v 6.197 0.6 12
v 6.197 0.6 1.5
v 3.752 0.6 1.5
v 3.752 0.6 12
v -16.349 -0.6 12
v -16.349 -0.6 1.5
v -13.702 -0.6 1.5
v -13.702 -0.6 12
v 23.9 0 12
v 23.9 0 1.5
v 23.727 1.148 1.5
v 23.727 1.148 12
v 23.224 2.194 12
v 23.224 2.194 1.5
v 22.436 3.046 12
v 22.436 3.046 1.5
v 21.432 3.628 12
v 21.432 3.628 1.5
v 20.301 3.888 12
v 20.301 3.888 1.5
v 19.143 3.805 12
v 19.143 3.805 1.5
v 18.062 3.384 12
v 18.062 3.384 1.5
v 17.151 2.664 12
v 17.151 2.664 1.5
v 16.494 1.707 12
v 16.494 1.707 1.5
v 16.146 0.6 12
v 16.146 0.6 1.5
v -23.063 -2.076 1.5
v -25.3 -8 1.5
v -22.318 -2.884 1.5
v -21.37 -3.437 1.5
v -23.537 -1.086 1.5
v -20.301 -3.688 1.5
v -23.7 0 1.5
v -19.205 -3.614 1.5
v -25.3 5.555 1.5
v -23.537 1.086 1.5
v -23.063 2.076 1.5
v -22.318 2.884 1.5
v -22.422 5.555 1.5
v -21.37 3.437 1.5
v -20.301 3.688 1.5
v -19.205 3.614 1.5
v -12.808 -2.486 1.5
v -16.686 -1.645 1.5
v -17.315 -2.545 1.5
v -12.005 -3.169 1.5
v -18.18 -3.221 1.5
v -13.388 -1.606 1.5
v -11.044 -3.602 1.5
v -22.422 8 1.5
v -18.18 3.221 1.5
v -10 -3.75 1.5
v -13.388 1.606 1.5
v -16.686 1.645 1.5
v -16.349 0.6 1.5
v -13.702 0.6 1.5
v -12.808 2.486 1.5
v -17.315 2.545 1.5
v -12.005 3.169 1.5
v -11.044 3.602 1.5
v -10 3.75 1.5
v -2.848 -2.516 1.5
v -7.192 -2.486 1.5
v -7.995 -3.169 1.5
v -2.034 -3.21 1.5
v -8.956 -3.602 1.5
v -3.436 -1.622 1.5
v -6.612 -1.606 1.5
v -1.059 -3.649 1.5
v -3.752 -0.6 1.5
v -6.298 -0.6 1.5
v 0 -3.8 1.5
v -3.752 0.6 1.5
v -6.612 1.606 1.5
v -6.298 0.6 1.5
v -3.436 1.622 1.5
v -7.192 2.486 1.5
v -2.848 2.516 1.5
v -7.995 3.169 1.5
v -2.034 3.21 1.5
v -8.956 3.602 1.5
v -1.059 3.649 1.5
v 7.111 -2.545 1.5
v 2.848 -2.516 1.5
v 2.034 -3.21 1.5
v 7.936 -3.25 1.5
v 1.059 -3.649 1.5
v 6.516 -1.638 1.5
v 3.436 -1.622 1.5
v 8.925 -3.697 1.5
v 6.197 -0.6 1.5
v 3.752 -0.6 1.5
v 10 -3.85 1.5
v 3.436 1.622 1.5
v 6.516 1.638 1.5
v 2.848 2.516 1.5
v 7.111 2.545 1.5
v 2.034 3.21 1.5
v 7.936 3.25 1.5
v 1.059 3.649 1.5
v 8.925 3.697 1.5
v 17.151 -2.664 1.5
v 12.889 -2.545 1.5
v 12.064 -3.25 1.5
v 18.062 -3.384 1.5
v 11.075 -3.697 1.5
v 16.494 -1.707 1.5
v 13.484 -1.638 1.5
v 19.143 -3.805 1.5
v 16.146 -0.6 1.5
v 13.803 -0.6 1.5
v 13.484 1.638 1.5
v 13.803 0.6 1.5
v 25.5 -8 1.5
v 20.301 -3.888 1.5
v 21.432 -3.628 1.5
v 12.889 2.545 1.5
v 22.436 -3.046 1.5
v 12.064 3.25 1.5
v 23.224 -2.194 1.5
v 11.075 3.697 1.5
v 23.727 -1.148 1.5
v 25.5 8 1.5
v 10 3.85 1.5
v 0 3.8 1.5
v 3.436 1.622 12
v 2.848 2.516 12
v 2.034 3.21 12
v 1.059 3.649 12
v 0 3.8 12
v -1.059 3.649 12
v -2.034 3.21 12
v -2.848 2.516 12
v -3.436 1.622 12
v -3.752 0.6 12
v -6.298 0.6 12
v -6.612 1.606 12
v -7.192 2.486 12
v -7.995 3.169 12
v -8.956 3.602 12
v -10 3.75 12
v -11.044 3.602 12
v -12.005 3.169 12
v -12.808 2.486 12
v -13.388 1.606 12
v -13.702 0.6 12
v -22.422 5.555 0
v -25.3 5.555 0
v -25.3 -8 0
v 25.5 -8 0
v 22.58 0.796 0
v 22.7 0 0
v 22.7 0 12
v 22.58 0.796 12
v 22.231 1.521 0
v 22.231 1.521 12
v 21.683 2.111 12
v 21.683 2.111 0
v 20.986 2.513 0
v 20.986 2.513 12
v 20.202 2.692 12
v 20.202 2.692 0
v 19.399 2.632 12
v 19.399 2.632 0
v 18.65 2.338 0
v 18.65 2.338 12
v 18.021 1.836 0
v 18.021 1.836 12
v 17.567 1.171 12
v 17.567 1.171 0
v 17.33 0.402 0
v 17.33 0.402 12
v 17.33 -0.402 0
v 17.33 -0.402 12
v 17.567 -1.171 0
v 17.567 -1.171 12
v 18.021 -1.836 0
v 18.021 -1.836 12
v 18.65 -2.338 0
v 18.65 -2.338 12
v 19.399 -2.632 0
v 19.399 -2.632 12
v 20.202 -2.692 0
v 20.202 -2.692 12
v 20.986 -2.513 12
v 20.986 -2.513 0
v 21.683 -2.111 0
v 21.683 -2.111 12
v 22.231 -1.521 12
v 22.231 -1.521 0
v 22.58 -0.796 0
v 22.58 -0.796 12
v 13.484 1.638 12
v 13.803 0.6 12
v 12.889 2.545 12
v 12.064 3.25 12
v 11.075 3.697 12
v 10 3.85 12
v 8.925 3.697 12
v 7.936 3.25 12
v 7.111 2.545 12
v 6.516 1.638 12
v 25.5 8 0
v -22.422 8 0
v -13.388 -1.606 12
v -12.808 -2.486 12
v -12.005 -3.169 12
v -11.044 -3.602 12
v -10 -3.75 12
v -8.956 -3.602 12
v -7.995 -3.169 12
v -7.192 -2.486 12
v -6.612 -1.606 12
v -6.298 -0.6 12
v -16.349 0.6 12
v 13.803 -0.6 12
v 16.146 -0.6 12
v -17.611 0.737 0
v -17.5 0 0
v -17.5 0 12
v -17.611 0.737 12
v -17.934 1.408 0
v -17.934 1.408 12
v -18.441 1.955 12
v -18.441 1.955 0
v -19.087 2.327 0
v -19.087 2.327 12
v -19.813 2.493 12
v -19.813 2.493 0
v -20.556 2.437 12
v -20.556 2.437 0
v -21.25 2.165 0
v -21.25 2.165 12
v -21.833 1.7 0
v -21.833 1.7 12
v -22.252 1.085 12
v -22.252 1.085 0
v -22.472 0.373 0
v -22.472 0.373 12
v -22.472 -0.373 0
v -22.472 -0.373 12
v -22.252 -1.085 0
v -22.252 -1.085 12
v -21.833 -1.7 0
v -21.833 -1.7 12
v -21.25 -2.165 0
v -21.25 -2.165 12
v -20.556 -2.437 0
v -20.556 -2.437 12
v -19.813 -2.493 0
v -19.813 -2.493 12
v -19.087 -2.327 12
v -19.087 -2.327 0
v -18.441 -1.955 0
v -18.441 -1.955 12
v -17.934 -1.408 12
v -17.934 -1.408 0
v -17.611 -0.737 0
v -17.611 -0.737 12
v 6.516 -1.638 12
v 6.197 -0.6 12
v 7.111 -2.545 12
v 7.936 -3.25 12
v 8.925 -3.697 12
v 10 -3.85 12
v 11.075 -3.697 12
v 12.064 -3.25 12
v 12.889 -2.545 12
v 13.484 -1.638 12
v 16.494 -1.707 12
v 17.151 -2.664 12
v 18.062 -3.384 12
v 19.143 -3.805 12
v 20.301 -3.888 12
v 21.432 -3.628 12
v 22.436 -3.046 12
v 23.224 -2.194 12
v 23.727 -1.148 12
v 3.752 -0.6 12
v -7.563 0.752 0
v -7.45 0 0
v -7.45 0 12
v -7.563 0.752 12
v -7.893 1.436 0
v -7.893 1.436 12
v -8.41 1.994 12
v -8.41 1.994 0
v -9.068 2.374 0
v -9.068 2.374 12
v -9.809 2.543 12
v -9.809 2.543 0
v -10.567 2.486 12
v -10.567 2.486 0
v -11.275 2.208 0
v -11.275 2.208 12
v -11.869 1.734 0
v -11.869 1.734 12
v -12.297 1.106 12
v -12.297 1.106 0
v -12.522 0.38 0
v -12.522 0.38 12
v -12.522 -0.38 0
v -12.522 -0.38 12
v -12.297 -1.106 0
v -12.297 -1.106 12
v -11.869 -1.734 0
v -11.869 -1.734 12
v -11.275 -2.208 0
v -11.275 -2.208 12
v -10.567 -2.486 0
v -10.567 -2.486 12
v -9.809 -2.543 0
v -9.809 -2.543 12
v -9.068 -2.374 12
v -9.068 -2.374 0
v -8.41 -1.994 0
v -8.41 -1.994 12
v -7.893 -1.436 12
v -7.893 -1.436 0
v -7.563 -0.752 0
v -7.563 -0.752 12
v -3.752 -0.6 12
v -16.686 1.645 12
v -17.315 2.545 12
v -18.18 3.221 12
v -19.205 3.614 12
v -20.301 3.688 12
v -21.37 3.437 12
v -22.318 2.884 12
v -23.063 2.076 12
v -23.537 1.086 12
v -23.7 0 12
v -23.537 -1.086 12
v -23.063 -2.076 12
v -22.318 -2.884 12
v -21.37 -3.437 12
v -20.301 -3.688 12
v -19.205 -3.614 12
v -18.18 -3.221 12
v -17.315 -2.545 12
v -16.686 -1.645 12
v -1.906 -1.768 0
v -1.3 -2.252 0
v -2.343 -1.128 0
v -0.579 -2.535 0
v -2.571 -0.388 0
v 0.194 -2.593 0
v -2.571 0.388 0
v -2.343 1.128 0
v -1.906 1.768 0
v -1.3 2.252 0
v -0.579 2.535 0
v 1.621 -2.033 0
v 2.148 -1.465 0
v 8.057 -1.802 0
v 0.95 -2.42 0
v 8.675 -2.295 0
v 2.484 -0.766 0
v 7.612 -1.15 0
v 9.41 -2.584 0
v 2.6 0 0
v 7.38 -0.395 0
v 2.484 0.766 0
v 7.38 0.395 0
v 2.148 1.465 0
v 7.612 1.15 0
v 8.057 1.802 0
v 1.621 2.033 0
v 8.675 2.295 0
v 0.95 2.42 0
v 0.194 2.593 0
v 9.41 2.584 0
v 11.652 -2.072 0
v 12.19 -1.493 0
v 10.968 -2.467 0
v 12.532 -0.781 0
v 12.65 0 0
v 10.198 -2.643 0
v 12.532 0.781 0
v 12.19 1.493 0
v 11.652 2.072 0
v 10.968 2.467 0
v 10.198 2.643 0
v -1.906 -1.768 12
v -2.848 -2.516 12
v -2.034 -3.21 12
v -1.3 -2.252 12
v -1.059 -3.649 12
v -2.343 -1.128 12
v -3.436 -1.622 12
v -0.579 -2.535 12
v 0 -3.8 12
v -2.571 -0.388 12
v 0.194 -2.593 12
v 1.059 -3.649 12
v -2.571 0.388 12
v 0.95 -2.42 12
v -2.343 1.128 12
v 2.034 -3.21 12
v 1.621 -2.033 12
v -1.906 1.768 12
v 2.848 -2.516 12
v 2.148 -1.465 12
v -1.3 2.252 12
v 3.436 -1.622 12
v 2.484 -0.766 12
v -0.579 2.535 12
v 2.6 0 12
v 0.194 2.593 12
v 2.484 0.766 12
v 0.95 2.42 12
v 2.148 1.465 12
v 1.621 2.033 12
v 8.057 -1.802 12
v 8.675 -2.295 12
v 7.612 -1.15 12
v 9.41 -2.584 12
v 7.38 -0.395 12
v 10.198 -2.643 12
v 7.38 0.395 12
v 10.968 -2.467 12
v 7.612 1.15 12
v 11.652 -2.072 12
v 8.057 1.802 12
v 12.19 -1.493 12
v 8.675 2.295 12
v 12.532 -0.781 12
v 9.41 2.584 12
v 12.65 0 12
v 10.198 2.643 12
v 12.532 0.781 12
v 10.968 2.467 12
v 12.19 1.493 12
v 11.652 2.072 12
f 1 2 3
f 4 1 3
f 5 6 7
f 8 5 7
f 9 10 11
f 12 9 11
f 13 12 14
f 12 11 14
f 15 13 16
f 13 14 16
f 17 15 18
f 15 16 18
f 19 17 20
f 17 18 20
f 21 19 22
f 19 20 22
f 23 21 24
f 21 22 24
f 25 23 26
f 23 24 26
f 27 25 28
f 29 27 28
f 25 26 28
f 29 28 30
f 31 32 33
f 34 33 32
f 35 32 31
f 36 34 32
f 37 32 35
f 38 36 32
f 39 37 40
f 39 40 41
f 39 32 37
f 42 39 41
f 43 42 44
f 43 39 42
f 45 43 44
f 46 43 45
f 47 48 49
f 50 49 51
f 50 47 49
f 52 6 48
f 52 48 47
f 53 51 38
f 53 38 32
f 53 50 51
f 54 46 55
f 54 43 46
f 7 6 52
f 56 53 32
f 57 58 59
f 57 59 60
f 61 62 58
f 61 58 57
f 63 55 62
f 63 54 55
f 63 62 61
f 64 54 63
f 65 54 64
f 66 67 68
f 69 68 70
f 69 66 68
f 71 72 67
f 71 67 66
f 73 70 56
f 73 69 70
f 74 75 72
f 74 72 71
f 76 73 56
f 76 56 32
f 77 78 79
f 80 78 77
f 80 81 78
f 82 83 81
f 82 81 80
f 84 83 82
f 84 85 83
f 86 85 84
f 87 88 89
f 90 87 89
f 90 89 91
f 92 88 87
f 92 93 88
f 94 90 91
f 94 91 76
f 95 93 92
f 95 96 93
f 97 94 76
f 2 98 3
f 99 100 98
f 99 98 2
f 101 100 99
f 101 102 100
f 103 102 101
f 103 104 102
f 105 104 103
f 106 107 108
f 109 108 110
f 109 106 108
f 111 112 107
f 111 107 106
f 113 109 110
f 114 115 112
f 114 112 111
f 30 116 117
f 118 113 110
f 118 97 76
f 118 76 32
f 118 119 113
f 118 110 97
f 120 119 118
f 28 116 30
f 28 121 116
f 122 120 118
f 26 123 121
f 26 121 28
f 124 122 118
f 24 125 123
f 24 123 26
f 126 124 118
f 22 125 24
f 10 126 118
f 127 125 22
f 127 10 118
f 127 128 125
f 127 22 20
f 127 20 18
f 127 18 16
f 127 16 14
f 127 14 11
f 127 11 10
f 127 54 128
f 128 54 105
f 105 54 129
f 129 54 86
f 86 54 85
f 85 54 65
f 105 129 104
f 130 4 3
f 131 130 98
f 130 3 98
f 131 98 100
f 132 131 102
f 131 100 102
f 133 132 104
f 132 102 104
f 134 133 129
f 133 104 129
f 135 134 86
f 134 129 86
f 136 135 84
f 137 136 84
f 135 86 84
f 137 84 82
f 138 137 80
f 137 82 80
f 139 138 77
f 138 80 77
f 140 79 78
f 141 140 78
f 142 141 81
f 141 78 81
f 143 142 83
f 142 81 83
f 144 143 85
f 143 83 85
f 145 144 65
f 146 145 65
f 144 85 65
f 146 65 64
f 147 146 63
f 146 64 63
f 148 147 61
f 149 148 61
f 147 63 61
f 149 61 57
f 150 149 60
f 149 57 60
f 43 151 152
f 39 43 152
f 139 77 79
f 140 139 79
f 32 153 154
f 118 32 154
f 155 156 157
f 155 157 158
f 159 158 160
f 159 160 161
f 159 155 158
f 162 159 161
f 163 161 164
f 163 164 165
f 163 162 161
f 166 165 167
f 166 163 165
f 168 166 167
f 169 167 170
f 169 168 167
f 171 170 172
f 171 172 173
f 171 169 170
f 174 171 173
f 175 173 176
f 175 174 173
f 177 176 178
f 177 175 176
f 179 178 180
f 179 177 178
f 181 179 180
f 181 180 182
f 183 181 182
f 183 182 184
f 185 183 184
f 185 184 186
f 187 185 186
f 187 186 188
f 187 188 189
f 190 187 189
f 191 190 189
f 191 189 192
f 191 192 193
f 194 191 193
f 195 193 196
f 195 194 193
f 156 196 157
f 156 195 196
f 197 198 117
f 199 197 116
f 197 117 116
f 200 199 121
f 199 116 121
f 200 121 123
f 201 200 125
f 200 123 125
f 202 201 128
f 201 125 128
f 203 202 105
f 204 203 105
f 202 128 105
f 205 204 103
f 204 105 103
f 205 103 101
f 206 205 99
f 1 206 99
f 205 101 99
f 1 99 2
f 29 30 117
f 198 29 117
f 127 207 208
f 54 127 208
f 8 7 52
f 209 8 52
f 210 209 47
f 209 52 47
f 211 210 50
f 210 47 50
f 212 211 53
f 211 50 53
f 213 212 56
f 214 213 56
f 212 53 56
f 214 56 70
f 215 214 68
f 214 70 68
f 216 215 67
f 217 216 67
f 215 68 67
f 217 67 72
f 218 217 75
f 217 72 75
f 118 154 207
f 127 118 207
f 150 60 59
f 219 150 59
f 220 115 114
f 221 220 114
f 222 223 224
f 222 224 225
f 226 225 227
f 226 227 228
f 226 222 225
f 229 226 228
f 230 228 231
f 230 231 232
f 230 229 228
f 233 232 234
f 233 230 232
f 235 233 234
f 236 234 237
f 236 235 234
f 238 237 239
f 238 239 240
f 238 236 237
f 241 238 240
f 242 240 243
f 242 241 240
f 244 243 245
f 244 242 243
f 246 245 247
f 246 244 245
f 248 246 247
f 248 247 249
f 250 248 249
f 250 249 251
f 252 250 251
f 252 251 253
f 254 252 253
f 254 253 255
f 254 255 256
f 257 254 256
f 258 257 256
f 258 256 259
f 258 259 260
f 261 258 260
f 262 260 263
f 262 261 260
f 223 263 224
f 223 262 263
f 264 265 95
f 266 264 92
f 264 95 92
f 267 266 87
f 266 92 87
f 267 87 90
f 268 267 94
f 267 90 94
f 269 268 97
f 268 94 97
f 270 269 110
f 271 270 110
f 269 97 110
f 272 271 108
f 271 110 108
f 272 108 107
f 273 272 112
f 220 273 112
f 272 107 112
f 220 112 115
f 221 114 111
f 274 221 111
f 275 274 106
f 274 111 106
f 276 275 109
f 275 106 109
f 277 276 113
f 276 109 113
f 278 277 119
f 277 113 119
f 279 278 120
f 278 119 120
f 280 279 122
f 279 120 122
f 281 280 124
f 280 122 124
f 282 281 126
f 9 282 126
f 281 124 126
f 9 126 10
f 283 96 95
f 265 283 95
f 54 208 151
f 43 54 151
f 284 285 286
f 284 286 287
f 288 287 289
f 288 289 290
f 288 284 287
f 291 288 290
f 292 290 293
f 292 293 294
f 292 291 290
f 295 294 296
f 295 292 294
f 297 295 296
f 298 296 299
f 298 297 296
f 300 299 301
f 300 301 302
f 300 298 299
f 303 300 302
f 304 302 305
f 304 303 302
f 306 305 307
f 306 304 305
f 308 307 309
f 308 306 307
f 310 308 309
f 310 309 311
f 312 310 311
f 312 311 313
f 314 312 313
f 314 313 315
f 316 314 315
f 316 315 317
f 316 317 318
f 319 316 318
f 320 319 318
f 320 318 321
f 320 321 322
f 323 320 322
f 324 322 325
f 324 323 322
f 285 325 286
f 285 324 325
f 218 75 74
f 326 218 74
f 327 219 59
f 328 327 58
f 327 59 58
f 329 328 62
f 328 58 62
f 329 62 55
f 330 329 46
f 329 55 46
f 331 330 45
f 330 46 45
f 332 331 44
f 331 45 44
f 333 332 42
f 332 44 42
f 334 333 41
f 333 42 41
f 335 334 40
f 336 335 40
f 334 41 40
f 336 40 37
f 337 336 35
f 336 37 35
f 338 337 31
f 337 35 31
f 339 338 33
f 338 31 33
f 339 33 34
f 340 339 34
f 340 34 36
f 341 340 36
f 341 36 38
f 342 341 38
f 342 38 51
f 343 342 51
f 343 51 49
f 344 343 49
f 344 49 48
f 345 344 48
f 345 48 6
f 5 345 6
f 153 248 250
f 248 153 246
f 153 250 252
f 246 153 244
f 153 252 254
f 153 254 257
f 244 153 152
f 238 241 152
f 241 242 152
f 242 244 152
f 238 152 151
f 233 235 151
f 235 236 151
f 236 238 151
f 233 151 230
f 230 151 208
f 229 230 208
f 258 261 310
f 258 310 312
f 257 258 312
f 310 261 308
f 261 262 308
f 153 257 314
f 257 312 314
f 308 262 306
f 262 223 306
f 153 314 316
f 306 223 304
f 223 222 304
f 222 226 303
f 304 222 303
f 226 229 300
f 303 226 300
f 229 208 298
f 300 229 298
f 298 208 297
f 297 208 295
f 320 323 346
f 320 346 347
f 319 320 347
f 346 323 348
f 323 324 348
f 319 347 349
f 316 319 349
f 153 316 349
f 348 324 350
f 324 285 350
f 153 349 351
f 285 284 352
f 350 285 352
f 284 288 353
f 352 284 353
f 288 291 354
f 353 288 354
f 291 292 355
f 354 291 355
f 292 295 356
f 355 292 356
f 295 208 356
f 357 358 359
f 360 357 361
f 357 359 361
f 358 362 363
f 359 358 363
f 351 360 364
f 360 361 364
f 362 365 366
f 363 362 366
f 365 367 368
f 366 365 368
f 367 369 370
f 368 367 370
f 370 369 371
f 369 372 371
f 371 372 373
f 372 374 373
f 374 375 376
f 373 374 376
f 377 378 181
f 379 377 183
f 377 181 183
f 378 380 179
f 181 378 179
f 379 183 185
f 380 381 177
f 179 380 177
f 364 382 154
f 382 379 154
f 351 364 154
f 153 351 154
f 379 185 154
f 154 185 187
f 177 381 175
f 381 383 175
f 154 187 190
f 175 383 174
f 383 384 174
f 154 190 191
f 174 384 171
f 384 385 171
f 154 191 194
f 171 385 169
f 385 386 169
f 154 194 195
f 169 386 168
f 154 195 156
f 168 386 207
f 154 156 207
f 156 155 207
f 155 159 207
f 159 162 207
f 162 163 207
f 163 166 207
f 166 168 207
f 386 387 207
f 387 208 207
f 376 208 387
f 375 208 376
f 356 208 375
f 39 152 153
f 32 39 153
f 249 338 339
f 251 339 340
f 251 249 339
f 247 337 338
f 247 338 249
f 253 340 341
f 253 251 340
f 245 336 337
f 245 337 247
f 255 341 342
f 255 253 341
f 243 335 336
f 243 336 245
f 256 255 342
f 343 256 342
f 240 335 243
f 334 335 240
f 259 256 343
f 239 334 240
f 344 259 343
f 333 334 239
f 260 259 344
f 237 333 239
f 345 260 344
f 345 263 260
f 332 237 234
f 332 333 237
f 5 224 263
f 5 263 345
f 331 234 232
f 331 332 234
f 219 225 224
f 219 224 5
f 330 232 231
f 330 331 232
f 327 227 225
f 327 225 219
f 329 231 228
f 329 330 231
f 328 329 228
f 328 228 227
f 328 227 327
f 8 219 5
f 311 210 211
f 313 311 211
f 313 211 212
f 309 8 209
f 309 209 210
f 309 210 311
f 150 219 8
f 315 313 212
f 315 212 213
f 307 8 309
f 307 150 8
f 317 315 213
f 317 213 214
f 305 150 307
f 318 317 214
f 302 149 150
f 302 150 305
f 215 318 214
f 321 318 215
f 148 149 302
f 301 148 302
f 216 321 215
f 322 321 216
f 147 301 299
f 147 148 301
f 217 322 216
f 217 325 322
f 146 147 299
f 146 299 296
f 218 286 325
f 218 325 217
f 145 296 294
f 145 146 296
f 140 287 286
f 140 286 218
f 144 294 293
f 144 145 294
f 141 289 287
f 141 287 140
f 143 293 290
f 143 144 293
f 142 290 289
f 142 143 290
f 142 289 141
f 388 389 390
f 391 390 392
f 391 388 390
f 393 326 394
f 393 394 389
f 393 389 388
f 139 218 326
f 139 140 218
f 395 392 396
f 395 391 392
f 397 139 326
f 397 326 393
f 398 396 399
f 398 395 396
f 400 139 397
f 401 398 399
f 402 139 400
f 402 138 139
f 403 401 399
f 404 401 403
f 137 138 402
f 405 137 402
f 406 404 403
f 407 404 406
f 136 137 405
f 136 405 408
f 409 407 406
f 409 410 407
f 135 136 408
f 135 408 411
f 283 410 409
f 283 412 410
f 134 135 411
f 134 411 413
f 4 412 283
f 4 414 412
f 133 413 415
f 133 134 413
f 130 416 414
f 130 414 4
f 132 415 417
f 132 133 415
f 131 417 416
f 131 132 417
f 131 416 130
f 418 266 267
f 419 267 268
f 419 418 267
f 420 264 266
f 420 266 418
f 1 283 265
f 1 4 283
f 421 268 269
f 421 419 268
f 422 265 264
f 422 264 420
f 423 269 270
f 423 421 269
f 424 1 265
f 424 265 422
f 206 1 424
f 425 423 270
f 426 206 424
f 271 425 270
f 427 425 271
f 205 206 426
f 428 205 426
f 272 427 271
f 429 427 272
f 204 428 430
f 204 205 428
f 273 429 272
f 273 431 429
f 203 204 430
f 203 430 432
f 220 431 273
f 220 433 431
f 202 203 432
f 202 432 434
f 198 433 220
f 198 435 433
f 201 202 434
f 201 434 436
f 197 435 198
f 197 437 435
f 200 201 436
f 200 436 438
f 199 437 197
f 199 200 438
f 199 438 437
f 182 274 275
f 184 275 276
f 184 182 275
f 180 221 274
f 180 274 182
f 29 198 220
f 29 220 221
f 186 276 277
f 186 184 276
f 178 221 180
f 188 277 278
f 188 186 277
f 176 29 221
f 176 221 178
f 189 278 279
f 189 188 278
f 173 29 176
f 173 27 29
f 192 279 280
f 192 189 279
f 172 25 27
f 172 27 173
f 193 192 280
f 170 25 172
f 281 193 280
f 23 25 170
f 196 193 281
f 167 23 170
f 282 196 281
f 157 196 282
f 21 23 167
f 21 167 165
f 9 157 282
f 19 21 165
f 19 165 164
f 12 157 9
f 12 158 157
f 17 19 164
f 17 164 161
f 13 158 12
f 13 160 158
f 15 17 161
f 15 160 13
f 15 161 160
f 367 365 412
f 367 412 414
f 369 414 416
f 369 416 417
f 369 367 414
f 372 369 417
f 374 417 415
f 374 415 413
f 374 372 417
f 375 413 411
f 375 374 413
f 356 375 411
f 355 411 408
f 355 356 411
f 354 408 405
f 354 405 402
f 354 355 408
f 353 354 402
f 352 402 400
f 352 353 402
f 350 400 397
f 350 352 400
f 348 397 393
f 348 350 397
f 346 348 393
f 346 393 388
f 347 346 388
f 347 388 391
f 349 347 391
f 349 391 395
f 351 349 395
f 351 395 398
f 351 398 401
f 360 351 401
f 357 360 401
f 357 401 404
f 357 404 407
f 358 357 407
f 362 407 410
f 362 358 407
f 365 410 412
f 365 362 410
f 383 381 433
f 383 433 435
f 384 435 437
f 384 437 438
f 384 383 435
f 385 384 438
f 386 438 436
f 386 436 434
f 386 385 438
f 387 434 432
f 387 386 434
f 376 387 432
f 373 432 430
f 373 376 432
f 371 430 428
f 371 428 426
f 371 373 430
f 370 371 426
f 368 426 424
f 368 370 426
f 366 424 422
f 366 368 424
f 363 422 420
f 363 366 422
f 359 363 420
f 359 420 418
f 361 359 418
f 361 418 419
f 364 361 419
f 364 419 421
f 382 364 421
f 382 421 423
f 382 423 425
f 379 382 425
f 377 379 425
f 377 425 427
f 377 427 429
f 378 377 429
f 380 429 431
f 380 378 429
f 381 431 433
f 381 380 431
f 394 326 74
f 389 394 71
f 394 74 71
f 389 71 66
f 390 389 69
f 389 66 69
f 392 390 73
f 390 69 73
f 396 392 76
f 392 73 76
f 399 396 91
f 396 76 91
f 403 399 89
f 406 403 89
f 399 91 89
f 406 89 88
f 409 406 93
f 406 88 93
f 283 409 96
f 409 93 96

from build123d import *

# Parameters (mm, degrees)
F1_DEPTH = 1.5
F0_R     = 2.5
F0_R_2   = 2.55
F0_R_3   = 2.6
F0_R_4   = 2.65
F0_R_5   = 2.7
F2_DEPTH = 12


# Not quite as in the source:
# - a feature names something its author has since deleted; it is built from what else it names


with BuildPart() as f1:
    # F0 (on Top) → F1 (new body)
    with BuildSketch(Plane.XY):
        Polygon((-25.3, 5.5549060926), (-25.3, -8), (25.5, -8), (25.5, 8), (-22.4224738777, 8), (-22.4224738777, 5.5549060926), align=None)
        with BuildLine():
            ThreePointArc((-16.3489727473, -0.6), (-23.7, 0), (-16.3489727473, 0.6))
            Line((-16.3489727473, 0.6), (-13.7016888038, 0.6))
            ThreePointArc((-13.7016888038, 0.6), (-10, 3.75), (-6.2983111962, 0.6))
            Line((-6.2983111962, 0.6), (-3.7523326079, 0.6))
            ThreePointArc((-3.7523326079, 0.6), (0, 3.8), (3.7523326079, 0.6))
            Line((3.7523326079, 0.6), (6.197040626, 0.6))
            ThreePointArc((6.197040626, 0.6), (10, 3.85), (13.802959374, 0.6))
            Line((13.802959374, 0.6), (16.1464302264, 0.6))
            ThreePointArc((16.1464302264, 0.6), (20.3008968951, 3.888375118), (23.9, 0))
            ThreePointArc((23.9, 0), (20.3008968951, -3.888375118), (16.1464302264, -0.6))
            Line((16.1464302264, -0.6), (13.802959374, -0.6))
            ThreePointArc((13.802959374, -0.6), (10, -3.85), (6.197040626, -0.6))
            Line((6.197040626, -0.6), (3.7523326079, -0.6))
            ThreePointArc((3.7523326079, -0.6), (0, -3.8), (-3.7523326079, -0.6))
            Line((-3.7523326079, -0.6), (-6.2983111962, -0.6))
            ThreePointArc((-6.2983111962, -0.6), (-10, -3.75), (-13.7016888038, -0.6))
            Line((-13.7016888038, -0.6), (-16.3489727473, -0.6))
        make_face(mode=Mode.SUBTRACT)
    extrude(amount=F1_DEPTH)

    # F0 (on Top) → F2 (join)
    with BuildSketch(Plane.XY):
        with BuildLine():
            ThreePointArc((-16.3489727473, -0.6), (-16.3122635103, -0.3009976453), (-16.3, 0))
            ThreePointArc((-16.3, 0), (-16.3122635103, 0.3009976453), (-16.3489727473, 0.6))
            ThreePointArc((-16.3489727473, 0.6), (-23.7, 0), (-16.3489727473, -0.6))
        make_face()
        with Locations((-20, 0)):
            Circle(F0_R, mode=Mode.SUBTRACT)
        with BuildLine():
            ThreePointArc((-16.3489727473, 0.6), (-16.3122635103, 0.3009976453), (-16.3, 0))
            ThreePointArc((-16.3, 0), (-16.3122635103, -0.3009976453), (-16.3489727473, -0.6))
            Line((-16.3489727473, -0.6), (-13.7016888038, -0.6))
            ThreePointArc((-13.7016888038, -0.6), (-13.75, 0), (-13.7016888038, 0.6))
            Line((-13.7016888038, 0.6), (-16.3489727473, 0.6))
        make_face()
        with BuildLine():
            ThreePointArc((-6.2983111962, 0.6), (-10, 3.75), (-13.7016888038, 0.6))
            ThreePointArc((-13.7016888038, 0.6), (-13.75, 0), (-13.7016888038, -0.6))
            ThreePointArc((-13.7016888038, -0.6), (-10, -3.75), (-6.2983111962, -0.6))
            ThreePointArc((-6.2983111962, -0.6), (-6.2620973117, -0.3009709171), (-6.25, 0))
            ThreePointArc((-6.25, 0), (-6.2620973117, 0.3009709171), (-6.2983111962, 0.6))
        make_face()
        with Locations((-10, 0)):
            Circle(F0_R_2, mode=Mode.SUBTRACT)
        with BuildLine():
            Line((-3.7523326079, 0.6), (-6.2983111962, 0.6))
            ThreePointArc((-6.2983111962, 0.6), (-6.2620973117, 0.3009709171), (-6.25, 0))
            ThreePointArc((-6.25, 0), (-6.2620973117, -0.3009709171), (-6.2983111962, -0.6))
            Line((-6.2983111962, -0.6), (-3.7523326079, -0.6))
            ThreePointArc((-3.7523326079, -0.6), (-3.8, 0), (-3.7523326079, 0.6))
        make_face()
        with BuildLine():
            ThreePointArc((3.7523326079, 0.6), (0, 3.8), (-3.7523326079, 0.6))
            ThreePointArc((-3.7523326079, 0.6), (-3.8, 0), (-3.7523326079, -0.6))
            ThreePointArc((-3.7523326079, -0.6), (0, -3.8), (3.7523326079, -0.6))
            ThreePointArc((3.7523326079, -0.6), (3.7880644074, -0.3009452526), (3.8, 0))
            ThreePointArc((3.8, 0), (3.7880644074, 0.3009452526), (3.7523326079, 0.6))
        make_face()
        Circle(F0_R_3, mode=Mode.SUBTRACT)
        with BuildLine():
            Line((6.197040626, 0.6), (3.7523326079, 0.6))
            ThreePointArc((3.7523326079, 0.6), (3.7880644074, 0.3009452526), (3.8, 0))
            ThreePointArc((3.8, 0), (3.7880644074, -0.3009452526), (3.7523326079, -0.6))
            Line((3.7523326079, -0.6), (6.197040626, -0.6))
            ThreePointArc((6.197040626, -0.6), (6.15, 0), (6.197040626, 0.6))
        make_face()
        with BuildLine():
            ThreePointArc((13.802959374, 0.6), (10, 3.85), (6.197040626, 0.6))
            ThreePointArc((6.197040626, 0.6), (6.15, 0), (6.197040626, -0.6))
            ThreePointArc((6.197040626, -0.6), (10, -3.85), (13.802959374, -0.6))
            ThreePointArc((13.802959374, -0.6), (13.8382218272, -0.300920596), (13.85, 0))
            ThreePointArc((13.85, 0), (13.8382218272, 0.300920596), (13.802959374, 0.6))
        make_face()
        with Locations((10, 0)):
            Circle(F0_R_4, mode=Mode.SUBTRACT)
        with BuildLine():
            Line((16.1464302264, 0.6), (13.802959374, 0.6))
            ThreePointArc((13.802959374, 0.6), (13.8382218272, 0.300920596), (13.85, 0))
            ThreePointArc((13.85, 0), (13.8382218272, -0.300920596), (13.802959374, -0.6))
            Line((13.802959374, -0.6), (16.1464302264, -0.6))
            ThreePointArc((16.1464302264, -0.6), (16.1, 0), (16.1464302264, 0.6))
        make_face()
        with BuildLine():
            ThreePointArc((23.9, 0), (20.3008968951, 3.888375118), (16.1464302264, 0.6))
            ThreePointArc((16.1464302264, 0.6), (16.1, 0), (16.1464302264, -0.6))
            ThreePointArc((16.1464302264, -0.6), (20.3008968951, -3.888375118), (23.9, 0))
        make_face()
        with Locations((20, 0)):
            Circle(F0_R_5, mode=Mode.SUBTRACT)
    extrude(amount=F2_DEPTH)


solid = f1.part
